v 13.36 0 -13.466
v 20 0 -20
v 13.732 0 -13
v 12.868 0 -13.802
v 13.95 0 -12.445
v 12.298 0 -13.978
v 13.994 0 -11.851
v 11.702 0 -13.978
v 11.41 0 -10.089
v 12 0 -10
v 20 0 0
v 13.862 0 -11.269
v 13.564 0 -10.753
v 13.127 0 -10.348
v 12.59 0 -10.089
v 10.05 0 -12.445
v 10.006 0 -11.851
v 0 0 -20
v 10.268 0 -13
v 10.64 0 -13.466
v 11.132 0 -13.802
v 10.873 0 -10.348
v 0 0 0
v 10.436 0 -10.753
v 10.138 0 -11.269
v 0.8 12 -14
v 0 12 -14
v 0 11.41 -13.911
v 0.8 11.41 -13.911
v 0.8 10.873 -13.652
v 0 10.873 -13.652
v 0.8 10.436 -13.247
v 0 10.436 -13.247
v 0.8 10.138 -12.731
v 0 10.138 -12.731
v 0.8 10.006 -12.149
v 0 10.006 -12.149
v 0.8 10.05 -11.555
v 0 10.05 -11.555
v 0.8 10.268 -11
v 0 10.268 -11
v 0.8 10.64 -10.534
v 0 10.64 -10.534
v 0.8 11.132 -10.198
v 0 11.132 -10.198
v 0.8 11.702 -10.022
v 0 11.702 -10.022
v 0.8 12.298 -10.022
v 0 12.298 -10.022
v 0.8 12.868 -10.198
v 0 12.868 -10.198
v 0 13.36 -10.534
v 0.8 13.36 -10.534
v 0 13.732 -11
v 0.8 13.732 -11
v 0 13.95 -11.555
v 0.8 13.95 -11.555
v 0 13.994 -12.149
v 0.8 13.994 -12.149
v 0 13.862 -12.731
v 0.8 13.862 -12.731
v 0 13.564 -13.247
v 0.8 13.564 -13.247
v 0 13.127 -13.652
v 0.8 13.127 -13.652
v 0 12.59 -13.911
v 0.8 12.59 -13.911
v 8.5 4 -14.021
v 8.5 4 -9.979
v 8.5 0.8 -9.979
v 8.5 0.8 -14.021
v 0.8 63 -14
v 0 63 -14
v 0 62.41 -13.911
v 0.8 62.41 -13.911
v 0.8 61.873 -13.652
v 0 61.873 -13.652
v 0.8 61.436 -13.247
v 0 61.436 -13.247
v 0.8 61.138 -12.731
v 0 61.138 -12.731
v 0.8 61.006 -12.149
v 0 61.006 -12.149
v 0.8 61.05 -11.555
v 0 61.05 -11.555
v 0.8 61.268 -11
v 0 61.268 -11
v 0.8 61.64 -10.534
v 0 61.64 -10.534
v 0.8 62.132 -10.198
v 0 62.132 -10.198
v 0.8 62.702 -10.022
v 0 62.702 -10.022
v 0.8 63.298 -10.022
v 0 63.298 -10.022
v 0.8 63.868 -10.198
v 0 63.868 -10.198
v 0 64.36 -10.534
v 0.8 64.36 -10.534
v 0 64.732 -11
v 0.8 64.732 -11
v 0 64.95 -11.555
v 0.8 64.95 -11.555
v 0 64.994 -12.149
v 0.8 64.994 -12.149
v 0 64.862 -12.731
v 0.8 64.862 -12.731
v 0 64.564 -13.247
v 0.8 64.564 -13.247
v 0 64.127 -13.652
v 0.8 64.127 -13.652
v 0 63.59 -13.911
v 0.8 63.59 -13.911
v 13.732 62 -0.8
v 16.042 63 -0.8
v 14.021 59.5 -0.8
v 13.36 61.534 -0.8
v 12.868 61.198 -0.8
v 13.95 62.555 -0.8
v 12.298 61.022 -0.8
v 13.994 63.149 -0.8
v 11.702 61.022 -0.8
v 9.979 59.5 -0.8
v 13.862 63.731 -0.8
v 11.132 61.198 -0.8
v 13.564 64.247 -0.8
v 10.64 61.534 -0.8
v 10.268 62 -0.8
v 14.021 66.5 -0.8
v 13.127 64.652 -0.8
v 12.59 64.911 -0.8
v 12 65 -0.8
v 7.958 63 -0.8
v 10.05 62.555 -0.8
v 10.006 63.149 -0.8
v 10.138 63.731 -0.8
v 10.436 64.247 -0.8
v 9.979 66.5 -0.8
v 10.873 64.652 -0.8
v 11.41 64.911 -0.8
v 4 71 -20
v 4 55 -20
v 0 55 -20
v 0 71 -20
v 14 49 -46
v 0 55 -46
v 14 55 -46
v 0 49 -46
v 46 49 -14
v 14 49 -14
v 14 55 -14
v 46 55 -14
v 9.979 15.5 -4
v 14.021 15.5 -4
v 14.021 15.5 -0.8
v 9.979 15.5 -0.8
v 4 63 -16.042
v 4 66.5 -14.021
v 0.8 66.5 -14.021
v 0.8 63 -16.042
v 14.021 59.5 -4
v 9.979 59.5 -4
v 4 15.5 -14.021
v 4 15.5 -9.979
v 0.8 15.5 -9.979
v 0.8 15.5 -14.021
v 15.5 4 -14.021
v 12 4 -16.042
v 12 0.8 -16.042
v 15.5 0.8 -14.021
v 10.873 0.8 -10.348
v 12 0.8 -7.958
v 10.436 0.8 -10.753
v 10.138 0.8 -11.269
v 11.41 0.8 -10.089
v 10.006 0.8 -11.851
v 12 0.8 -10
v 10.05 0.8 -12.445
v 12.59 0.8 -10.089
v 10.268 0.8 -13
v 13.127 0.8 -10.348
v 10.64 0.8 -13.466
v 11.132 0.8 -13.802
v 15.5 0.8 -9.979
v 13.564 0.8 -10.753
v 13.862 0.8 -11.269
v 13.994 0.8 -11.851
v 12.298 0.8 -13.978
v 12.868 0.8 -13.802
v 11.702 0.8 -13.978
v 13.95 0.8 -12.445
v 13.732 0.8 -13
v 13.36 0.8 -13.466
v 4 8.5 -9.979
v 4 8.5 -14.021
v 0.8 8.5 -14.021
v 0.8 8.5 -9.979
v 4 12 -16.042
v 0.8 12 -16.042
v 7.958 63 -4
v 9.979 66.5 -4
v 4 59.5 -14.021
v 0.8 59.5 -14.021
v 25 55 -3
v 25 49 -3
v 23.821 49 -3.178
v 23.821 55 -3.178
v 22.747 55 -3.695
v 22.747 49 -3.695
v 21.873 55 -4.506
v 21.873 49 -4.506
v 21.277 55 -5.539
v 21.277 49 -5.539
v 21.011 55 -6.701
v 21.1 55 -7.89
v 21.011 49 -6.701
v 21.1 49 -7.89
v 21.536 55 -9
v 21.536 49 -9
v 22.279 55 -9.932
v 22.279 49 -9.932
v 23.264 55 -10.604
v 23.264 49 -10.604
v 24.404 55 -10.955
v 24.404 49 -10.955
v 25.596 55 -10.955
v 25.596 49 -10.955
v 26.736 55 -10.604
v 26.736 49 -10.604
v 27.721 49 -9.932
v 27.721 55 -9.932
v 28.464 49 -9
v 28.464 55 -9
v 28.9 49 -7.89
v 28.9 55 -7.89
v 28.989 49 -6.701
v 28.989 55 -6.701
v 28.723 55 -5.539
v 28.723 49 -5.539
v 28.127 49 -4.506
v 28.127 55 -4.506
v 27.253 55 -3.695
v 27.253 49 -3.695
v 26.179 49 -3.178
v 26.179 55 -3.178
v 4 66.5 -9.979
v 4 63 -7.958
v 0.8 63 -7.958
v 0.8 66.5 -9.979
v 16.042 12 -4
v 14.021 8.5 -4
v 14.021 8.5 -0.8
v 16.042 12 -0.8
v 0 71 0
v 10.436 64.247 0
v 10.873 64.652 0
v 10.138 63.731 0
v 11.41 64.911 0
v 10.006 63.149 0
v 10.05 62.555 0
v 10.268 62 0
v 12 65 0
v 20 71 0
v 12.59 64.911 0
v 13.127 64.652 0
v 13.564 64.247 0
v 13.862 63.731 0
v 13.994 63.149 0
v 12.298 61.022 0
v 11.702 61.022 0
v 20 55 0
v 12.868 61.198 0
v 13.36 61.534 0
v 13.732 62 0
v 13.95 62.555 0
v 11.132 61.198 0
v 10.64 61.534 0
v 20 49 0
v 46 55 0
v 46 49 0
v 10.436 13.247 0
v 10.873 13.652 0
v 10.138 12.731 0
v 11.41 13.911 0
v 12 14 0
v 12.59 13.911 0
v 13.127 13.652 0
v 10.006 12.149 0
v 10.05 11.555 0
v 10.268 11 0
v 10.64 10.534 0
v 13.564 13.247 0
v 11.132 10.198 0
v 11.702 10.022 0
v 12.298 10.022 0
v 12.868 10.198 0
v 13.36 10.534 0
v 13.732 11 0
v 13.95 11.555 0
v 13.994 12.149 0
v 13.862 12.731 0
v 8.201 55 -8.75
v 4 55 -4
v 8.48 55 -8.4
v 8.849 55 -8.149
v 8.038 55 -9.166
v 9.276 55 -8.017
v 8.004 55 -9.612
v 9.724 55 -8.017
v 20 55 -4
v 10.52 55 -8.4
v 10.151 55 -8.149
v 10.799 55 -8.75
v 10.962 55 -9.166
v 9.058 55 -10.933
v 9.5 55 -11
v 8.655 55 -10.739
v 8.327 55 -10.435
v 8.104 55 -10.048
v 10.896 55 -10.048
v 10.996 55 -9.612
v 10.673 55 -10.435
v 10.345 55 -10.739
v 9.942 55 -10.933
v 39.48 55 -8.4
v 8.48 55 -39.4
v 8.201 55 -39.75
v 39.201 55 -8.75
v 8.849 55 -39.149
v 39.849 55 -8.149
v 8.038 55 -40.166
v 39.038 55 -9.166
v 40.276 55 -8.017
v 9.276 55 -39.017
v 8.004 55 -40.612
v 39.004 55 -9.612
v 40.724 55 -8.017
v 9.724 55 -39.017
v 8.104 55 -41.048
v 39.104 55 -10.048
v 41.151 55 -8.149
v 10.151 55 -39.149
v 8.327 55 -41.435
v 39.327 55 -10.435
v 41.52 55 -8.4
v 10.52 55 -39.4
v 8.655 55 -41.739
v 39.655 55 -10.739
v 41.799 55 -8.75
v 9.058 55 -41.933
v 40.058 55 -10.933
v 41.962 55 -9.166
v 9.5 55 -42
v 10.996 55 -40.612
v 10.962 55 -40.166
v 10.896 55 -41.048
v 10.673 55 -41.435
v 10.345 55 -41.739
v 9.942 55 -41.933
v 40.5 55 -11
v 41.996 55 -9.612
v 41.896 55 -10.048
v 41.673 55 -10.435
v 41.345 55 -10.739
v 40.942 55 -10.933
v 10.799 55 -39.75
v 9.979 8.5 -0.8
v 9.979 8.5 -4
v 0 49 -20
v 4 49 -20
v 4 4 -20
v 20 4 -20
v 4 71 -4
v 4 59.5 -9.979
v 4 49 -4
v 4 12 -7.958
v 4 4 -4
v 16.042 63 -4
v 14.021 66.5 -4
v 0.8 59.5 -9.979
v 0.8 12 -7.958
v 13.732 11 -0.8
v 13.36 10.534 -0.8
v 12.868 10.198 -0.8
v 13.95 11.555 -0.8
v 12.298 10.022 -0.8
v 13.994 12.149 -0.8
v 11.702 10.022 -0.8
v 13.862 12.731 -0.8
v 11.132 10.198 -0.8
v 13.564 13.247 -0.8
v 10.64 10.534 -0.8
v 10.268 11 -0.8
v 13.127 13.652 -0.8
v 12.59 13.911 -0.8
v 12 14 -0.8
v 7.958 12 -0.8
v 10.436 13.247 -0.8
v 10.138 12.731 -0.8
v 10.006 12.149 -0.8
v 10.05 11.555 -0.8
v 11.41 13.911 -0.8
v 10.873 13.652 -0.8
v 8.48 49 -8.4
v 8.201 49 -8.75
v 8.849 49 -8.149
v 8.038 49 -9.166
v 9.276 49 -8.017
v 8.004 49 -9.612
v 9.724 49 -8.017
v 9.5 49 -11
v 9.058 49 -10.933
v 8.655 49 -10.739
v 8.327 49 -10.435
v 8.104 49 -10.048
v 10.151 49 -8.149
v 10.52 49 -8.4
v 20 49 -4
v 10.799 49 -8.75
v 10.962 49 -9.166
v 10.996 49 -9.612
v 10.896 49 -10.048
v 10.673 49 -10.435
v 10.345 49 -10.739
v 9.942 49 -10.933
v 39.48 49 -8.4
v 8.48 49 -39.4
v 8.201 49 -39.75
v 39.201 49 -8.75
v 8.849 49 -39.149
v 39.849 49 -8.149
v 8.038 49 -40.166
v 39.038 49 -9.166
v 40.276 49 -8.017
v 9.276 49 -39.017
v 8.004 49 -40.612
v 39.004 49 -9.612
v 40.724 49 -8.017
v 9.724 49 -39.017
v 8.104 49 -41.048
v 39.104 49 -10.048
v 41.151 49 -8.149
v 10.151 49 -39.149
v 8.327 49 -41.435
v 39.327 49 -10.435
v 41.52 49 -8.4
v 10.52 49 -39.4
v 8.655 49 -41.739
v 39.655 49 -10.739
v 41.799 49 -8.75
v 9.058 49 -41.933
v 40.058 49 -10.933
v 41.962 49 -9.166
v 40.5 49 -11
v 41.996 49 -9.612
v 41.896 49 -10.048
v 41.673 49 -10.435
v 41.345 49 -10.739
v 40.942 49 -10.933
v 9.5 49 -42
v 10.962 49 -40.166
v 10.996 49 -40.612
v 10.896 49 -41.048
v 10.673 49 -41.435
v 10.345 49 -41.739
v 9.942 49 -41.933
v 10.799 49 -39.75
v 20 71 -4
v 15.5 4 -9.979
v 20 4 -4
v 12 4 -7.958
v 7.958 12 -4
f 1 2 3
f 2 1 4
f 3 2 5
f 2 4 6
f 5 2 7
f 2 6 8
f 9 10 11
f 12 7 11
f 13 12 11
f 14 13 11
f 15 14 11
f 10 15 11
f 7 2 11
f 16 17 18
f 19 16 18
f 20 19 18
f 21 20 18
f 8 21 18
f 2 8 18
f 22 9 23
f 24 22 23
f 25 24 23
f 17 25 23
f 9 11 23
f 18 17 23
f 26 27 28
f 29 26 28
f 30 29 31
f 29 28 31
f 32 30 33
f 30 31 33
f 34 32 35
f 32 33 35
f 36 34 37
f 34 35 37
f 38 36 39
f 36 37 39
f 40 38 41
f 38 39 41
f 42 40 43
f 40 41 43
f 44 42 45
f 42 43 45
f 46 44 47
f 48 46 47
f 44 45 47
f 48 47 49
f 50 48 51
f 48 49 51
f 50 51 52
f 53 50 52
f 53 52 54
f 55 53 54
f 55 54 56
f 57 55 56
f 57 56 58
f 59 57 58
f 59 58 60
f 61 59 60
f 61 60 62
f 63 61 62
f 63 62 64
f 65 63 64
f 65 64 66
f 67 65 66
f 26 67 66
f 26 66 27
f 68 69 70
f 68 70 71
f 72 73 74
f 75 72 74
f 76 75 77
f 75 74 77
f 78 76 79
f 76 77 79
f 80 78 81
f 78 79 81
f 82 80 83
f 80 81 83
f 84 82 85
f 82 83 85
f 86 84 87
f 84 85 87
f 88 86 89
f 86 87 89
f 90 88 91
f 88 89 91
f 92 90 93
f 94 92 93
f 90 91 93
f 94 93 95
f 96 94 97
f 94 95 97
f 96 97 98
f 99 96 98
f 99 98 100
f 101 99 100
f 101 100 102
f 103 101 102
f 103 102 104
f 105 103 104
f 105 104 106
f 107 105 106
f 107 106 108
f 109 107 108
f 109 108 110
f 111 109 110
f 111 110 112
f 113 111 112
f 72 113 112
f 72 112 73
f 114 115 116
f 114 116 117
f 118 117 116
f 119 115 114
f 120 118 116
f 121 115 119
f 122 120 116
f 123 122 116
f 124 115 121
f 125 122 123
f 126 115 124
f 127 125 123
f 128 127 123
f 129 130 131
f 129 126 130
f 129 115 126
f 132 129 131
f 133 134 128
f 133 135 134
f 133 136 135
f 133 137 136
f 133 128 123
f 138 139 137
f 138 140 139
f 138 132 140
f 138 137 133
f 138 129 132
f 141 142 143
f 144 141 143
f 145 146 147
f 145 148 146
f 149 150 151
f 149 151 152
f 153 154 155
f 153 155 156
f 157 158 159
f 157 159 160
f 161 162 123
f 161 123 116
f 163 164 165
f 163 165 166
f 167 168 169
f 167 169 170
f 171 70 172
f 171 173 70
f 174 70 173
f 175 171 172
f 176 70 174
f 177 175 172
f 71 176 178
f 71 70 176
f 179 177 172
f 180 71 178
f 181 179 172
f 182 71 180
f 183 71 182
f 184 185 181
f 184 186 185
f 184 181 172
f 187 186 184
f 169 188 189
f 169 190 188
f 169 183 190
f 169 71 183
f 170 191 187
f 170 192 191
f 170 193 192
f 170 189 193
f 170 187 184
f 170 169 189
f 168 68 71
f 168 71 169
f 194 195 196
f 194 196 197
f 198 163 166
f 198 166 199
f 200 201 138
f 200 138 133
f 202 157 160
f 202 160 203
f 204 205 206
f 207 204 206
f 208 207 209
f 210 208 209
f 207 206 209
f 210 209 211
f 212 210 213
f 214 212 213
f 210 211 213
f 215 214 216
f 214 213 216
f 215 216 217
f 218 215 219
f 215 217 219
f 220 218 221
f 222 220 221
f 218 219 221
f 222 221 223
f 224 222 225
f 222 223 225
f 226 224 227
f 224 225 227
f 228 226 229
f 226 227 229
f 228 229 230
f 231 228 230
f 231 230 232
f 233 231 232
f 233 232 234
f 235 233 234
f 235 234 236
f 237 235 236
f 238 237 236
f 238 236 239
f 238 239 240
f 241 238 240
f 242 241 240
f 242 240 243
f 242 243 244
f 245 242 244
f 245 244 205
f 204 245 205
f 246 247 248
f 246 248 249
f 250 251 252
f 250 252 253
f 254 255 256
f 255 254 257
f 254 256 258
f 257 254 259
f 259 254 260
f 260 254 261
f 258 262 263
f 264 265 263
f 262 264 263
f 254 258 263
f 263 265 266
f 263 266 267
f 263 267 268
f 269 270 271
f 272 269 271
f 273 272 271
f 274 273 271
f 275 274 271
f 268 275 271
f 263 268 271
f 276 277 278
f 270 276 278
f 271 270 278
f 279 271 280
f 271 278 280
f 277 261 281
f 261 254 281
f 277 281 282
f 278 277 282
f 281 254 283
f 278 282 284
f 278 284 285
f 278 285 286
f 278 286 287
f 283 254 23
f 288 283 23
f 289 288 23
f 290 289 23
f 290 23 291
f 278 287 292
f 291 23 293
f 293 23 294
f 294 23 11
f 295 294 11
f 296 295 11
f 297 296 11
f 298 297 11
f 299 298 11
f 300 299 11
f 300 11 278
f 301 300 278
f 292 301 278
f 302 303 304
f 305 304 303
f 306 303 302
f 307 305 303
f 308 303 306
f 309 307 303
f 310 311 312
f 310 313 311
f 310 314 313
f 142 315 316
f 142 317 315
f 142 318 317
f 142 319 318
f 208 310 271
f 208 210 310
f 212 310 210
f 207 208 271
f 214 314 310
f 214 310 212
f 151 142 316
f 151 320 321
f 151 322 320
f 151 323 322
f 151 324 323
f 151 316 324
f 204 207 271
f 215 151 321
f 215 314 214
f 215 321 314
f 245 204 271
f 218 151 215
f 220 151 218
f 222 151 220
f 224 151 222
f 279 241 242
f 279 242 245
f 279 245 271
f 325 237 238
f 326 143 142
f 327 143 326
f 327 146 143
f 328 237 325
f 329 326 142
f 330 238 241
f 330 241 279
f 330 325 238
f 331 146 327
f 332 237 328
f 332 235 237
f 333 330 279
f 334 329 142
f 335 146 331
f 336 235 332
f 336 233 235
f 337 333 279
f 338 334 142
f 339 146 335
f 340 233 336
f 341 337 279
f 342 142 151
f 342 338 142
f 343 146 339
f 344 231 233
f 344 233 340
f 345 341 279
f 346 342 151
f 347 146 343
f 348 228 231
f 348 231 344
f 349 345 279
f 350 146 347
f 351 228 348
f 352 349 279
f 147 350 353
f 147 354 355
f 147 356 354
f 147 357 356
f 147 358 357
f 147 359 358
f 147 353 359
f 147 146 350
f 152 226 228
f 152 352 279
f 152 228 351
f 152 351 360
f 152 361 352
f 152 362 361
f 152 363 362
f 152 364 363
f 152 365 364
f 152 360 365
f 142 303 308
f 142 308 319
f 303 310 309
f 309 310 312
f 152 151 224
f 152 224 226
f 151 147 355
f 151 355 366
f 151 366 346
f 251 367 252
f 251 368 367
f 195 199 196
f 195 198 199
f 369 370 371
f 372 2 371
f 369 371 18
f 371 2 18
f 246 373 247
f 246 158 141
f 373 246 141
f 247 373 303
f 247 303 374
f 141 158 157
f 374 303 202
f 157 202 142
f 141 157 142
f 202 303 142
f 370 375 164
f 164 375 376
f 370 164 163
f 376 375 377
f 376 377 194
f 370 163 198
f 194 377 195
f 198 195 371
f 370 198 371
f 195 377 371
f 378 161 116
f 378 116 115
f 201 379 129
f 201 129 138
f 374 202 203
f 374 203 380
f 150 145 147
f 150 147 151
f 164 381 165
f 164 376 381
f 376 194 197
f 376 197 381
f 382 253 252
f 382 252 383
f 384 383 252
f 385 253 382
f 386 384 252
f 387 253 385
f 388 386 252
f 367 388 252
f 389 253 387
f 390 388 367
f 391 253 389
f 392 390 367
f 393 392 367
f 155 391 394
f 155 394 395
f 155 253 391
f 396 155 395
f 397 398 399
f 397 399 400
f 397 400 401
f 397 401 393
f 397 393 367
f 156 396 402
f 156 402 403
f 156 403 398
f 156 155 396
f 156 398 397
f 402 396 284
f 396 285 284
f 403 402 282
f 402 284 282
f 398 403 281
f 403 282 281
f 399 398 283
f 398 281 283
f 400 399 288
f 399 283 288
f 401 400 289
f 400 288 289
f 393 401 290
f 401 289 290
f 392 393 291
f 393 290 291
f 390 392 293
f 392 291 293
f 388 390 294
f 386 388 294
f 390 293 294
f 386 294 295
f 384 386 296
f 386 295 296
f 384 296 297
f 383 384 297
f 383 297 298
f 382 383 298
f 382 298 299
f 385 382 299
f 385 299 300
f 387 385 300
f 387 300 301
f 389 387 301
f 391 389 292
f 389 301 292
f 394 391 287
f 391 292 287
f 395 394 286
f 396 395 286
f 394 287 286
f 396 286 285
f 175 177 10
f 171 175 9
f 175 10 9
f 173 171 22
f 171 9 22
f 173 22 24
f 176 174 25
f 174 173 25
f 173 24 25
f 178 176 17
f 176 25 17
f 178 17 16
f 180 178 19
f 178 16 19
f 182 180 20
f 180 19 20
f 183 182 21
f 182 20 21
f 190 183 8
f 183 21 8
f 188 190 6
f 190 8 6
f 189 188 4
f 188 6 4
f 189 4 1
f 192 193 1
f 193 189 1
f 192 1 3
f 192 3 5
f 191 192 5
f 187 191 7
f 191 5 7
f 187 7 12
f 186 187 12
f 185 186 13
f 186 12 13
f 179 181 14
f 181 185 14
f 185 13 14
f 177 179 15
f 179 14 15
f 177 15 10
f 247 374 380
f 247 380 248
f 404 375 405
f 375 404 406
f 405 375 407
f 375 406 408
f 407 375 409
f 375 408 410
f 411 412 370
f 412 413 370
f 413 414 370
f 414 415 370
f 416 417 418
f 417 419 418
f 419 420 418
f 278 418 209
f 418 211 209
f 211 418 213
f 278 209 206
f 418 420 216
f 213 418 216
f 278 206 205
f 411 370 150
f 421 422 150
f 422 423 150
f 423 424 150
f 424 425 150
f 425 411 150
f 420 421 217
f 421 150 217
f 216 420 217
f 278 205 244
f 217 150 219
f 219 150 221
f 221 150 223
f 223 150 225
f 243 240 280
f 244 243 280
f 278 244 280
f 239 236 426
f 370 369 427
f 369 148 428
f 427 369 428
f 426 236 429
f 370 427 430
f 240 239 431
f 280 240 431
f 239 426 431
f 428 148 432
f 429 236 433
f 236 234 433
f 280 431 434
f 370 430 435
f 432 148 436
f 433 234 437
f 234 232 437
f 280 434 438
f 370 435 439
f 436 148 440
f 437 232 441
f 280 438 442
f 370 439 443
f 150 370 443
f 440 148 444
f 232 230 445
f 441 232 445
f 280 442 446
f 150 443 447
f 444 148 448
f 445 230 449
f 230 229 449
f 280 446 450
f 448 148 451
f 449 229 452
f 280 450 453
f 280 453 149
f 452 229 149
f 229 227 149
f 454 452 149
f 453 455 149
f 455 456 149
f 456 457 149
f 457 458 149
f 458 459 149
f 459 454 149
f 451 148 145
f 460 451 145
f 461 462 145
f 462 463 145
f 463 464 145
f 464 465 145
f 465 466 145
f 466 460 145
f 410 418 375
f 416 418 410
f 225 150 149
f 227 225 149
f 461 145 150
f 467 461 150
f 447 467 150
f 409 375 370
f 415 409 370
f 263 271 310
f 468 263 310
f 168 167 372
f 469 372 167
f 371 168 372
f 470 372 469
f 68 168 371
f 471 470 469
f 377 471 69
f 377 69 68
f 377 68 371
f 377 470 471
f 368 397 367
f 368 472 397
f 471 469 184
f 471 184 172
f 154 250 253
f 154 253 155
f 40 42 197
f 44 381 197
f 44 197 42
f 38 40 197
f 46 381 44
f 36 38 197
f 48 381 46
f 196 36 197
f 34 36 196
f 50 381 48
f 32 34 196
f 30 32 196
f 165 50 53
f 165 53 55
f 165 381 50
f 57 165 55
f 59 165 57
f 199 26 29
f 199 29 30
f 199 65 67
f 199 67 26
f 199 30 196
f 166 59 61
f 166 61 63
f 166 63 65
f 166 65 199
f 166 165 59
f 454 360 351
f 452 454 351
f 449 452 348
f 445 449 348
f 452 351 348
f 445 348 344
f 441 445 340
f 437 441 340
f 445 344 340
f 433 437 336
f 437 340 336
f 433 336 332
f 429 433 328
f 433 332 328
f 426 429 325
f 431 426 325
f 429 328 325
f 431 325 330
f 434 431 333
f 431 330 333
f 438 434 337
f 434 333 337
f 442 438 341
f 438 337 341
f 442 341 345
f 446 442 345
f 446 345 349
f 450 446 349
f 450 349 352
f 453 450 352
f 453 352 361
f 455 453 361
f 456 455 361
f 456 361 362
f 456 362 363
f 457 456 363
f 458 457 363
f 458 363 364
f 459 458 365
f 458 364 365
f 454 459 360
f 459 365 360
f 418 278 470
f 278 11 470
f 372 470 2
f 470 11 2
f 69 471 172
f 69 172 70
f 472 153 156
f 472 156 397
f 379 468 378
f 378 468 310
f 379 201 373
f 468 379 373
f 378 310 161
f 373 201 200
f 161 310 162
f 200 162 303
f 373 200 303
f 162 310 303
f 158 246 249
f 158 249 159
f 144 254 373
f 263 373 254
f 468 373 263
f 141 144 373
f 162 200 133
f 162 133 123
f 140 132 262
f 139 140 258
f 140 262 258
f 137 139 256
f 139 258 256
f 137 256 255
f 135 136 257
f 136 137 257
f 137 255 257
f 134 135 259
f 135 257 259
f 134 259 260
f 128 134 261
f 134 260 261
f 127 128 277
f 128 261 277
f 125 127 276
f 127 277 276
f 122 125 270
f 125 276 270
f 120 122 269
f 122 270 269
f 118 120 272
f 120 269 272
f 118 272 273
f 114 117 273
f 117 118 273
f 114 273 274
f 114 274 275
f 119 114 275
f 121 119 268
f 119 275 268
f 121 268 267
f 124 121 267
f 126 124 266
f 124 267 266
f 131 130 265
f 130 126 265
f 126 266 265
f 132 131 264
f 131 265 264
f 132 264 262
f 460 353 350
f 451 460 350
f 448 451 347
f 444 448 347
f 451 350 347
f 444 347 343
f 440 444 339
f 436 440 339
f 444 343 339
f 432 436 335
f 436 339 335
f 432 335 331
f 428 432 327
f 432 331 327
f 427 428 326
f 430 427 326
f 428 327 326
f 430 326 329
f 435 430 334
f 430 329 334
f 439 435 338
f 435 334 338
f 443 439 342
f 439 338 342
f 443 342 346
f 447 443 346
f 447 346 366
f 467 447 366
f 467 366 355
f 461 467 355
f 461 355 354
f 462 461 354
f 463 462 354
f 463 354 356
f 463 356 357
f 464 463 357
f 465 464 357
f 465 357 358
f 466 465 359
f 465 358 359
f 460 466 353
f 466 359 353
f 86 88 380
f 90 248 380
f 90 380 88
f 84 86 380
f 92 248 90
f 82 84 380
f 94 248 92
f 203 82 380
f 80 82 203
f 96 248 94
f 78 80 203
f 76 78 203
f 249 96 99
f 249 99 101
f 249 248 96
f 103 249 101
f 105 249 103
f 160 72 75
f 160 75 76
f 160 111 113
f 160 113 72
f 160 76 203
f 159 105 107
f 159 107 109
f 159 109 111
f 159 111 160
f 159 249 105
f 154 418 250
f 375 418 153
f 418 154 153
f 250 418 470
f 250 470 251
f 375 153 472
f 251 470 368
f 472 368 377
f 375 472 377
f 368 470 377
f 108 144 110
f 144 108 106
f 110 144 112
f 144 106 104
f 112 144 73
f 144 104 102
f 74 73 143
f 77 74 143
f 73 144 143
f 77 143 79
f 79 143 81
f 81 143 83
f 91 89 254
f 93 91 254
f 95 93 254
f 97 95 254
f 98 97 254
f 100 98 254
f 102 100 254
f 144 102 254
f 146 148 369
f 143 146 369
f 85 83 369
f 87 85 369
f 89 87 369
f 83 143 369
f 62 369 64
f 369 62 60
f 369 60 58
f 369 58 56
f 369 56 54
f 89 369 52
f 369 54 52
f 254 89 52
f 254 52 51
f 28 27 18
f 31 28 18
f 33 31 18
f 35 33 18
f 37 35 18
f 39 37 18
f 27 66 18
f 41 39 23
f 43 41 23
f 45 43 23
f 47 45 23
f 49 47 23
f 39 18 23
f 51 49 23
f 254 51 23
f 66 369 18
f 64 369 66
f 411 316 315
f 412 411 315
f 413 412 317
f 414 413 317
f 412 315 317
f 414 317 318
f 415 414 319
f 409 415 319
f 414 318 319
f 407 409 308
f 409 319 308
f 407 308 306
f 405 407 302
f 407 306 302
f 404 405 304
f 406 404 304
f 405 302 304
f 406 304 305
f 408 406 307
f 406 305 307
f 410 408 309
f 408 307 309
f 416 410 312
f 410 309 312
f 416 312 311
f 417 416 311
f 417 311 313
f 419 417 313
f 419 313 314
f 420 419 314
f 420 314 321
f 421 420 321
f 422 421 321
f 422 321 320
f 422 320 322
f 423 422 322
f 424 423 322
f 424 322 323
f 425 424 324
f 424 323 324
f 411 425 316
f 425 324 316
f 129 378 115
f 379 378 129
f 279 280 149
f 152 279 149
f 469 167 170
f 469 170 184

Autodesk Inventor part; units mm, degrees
ref_plane "YZ Plane" through (0, 0, 0) normal (1, 0, 0) x (0, 1, 0)
ref_plane "XZ Plane" through (0, 0, 0) normal (0, 1, 0) x (-1, 0, 0)
ref_plane "XY Plane" through (0, 0, 0) normal (0, 0, 1) x (1, 0, 0)
sketch "Sketch1" plane through (0, 0, 0) normal (0, 1, 0) x (-1, 0, 0)
  line L0 (0, 0) -> (-20, 0)
  line L1 (-20, 0) -> (-20, -20)
  line L2 (-20, -20) -> (0, -20)
  line L3 (0, -20) -> (0, 0)
  dimension "d0" = 20
  dimension "d1" = 20
extrude "Extrusion1" add sketch "Sketch1" along normal blind 4
sketch "Sketch2" plane through (0, 4, 0) normal (0, 1, 0) x (1, 0, 0)
  line L0 (0, 0) -> (20, 0)
  line L1 (20, 0) -> (20, 4)
  line L2 (20, 4) -> (4, 4)
  line L3 (0, 4) -> (0, 0)
  line L4 (0, 0) -> (4, 0)
  line L5 (4, 20) -> (0, 20)
  line L6 (0, 20) -> (0, 0)
  line L7 (4, 4) -> (4, 20)
  line L8 (0, 0) -> (20, 0) projected
  line L9 (0, 0) -> (20, 0)
  line L10 (0, 20) -> (0, 0) projected
  line L11 (0, 0) -> (0, 20)
extrude "Extrusion2" add sketch "Sketch2" along normal blind 45
hole "Hole2" at (12, 12, -4) direction (0, 0, 1) diameter 4 end through all
hole "Hole3" at (4, 12, -12) direction (-1, 0, 0) diameter 4 end through all
hole "Hole4" at (12, 4, -12) direction (0, -1, 0) diameter 4 end through all
sketch "Sketch3" plane through (20, 4, -4) normal (0, 0, -1) x (-1, 0, 0)
  line L0 (12.0415, 8) -> (10.0207, 4.5)
  line L1 (10.0207, 4.5) -> (5.9793, 4.5)
  line L2 (5.9793, 4.5) -> (3.9585, 8)
  line L3 (3.9585, 8) -> (5.9793, 11.5)
  line L4 (5.9793, 11.5) -> (10.0207, 11.5)
  line L5 (10.0207, 11.5) -> (12.0415, 8)
  point P0 (20, -4)
  point P1 (8, 8)
  dimension "d51" = 7
sketch "Sketch4" plane through (4, 4, -4) normal (1, 0, 0) x (0, 0, -1)
  line L0 (12.0415, 8) -> (10.0207, 4.5)
  line L1 (10.0207, 4.5) -> (5.9793, 4.5)
  line L2 (5.9793, 4.5) -> (3.9585, 8)
  line L3 (3.9585, 8) -> (5.9793, 11.5)
  line L4 (5.9793, 11.5) -> (10.0207, 11.5)
  line L5 (10.0207, 11.5) -> (12.0415, 8)
  point P0 (-4, -4)
  point P1 (8, 8)
  dimension "d52" = 7
sketch "Sketch5" plane through (0, 4, 0) normal (0, 1, 0) x (1, 0, 0)
  circle A0 centre (12, 12) radius 2 projected
  line L0 (12, 7.9585) -> (8.5, 9.9793)
  line L1 (8.5, 9.9793) -> (8.5, 14.0207)
  line L2 (8.5, 14.0207) -> (12, 16.0415)
  line L3 (12, 16.0415) -> (15.5, 14.0207)
  line L4 (15.5, 14.0207) -> (15.5, 9.9793)
  line L5 (15.5, 9.9793) -> (12, 7.9585)
  point P0 (0, 0)
  dimension "d53" = 7
extrude "Extrusion3" cut sketch "Sketch3" against normal blind 3.2
extrude "Extrusion4" cut sketch "Sketch4" against normal blind 3.2
extrude "Extrusion5" cut sketch "Sketch5" against normal blind 3.2
sketch "Sketch6" plane through (0, 49, 0) normal (0, 1, 0) x (1, 0, 0)
  line L0 (0, 0) -> (20, 0) projected
  line L1 (0, 0) -> (0, 46)
  line L2 (0, 20) -> (0, 0) projected
  line L3 (0, 0) -> (46, 0)
  line L4 (46, 0) -> (46, 14)
  line L5 (0, 46) -> (14, 46)
  line L6 (14, 46) -> (14, 14)
  line L7 (14, 14) -> (46, 14)
  line L8 (20, 4) -> (4, 4) projected
  line L9 (4, 4) -> (4, 20) projected
  line L10 (20, 20) -> (4, 20) projected
  line L11 (20, 4) -> (20, 20) projected
  point P0 (9.5, 9.5)
  point P1 (9.5, 40.5)
  point P2 (40.5, 9.5)
  dimension "d62" = 14
  dimension "d65" = 42
  dimension "d66" = 42
  dimension "d68" = 5.5
  dimension "d69" = 5.5
  dimension "d70" = 31
  dimension "d71" = 31
  dimension "d72" = 14
extrude "Extrusion6" add sketch "Sketch6" along normal blind 6 contours L1 L5 L6 L10 L9 L8 L11 L7 L4 L3 L0 | L11 L8 L9 L10 L6 L7
hole "Hole5" at (9.5, 49, -9.5) at (9.5, 49, -40.5) at (40.5, 49, -9.5) direction (0, 1, 0) diameter 3 end through all
sketch "Sketch7" plane through (0, 55, 0) normal (0, 1, 0) x (1, 0, 0)
  line L0 (0, 0) -> (20, 0) projected
  line L1 (20, 4) -> (4, 4) projected
  line L2 (0, 0) -> (20, 0)
  line L3 (20, 0) -> (20, 4)
  line L4 (20, 4) -> (4, 4)
  line L5 (0, 4) -> (0, 0)
  line L6 (0, 0) -> (4, 0)
  line L7 (4, 20) -> (0, 20)
  line L8 (0, 20) -> (0, 0)
  line L9 (4, 4) -> (4, 20)
  dimension "d82" = 20
  dimension "d83" = 4
  dimension "d84" = 4
  dimension "d85" = 20
extrude "Extrusion7" add sketch "Sketch7" along normal blind 16
hole "Hole6" at (12, 63, -4) direction (0, 0, 1) diameter 4 end through all
hole "Hole7" at (4, 63, -12) direction (-1, 0, 0) diameter 4 end through all
sketch "Sketch8" plane through (4, 55, -4) normal (1, 0, 0) x (0, 0, -1)
  line L0 (3.9585, 8) -> (5.9793, 11.5)
  line L1 (5.9793, 11.5) -> (10.0207, 11.5)
  line L2 (10.0207, 11.5) -> (12.0415, 8)
  line L3 (12.0415, 8) -> (10.0207, 4.5)
  line L4 (10.0207, 4.5) -> (5.9793, 4.5)
  line L5 (5.9793, 4.5) -> (3.9585, 8)
  point P0 (-4, -55)
  point P1 (8, 8)
  dimension "d106" = 7
sketch "Sketch9" plane through (20, 55, -4) normal (0, 0, -1) x (-1, 0, 0)
  circle A0 centre (8, 8) radius 2 projected
  line L0 (3.9585, 8) -> (5.9793, 11.5)
  line L1 (5.9793, 11.5) -> (10.0207, 11.5)
  line L2 (10.0207, 11.5) -> (12.0415, 8)
  line L3 (12.0415, 8) -> (10.0207, 4.5)
  line L4 (10.0207, 4.5) -> (5.9793, 4.5)
  line L5 (5.9793, 4.5) -> (3.9585, 8)
  point P0 (20, -55)
  dimension "d107" = 7
extrude "Extrusion8" cut sketch "Sketch9" against normal blind 3.2
extrude "Extrusion9" cut sketch "Sketch8" against normal blind 3.2
hole "Hole8" at (25, 55, -7) direction (0, -1, 0) diameter 8 end through all
properties part number "MotorMountRight" material "PLA Orange"
